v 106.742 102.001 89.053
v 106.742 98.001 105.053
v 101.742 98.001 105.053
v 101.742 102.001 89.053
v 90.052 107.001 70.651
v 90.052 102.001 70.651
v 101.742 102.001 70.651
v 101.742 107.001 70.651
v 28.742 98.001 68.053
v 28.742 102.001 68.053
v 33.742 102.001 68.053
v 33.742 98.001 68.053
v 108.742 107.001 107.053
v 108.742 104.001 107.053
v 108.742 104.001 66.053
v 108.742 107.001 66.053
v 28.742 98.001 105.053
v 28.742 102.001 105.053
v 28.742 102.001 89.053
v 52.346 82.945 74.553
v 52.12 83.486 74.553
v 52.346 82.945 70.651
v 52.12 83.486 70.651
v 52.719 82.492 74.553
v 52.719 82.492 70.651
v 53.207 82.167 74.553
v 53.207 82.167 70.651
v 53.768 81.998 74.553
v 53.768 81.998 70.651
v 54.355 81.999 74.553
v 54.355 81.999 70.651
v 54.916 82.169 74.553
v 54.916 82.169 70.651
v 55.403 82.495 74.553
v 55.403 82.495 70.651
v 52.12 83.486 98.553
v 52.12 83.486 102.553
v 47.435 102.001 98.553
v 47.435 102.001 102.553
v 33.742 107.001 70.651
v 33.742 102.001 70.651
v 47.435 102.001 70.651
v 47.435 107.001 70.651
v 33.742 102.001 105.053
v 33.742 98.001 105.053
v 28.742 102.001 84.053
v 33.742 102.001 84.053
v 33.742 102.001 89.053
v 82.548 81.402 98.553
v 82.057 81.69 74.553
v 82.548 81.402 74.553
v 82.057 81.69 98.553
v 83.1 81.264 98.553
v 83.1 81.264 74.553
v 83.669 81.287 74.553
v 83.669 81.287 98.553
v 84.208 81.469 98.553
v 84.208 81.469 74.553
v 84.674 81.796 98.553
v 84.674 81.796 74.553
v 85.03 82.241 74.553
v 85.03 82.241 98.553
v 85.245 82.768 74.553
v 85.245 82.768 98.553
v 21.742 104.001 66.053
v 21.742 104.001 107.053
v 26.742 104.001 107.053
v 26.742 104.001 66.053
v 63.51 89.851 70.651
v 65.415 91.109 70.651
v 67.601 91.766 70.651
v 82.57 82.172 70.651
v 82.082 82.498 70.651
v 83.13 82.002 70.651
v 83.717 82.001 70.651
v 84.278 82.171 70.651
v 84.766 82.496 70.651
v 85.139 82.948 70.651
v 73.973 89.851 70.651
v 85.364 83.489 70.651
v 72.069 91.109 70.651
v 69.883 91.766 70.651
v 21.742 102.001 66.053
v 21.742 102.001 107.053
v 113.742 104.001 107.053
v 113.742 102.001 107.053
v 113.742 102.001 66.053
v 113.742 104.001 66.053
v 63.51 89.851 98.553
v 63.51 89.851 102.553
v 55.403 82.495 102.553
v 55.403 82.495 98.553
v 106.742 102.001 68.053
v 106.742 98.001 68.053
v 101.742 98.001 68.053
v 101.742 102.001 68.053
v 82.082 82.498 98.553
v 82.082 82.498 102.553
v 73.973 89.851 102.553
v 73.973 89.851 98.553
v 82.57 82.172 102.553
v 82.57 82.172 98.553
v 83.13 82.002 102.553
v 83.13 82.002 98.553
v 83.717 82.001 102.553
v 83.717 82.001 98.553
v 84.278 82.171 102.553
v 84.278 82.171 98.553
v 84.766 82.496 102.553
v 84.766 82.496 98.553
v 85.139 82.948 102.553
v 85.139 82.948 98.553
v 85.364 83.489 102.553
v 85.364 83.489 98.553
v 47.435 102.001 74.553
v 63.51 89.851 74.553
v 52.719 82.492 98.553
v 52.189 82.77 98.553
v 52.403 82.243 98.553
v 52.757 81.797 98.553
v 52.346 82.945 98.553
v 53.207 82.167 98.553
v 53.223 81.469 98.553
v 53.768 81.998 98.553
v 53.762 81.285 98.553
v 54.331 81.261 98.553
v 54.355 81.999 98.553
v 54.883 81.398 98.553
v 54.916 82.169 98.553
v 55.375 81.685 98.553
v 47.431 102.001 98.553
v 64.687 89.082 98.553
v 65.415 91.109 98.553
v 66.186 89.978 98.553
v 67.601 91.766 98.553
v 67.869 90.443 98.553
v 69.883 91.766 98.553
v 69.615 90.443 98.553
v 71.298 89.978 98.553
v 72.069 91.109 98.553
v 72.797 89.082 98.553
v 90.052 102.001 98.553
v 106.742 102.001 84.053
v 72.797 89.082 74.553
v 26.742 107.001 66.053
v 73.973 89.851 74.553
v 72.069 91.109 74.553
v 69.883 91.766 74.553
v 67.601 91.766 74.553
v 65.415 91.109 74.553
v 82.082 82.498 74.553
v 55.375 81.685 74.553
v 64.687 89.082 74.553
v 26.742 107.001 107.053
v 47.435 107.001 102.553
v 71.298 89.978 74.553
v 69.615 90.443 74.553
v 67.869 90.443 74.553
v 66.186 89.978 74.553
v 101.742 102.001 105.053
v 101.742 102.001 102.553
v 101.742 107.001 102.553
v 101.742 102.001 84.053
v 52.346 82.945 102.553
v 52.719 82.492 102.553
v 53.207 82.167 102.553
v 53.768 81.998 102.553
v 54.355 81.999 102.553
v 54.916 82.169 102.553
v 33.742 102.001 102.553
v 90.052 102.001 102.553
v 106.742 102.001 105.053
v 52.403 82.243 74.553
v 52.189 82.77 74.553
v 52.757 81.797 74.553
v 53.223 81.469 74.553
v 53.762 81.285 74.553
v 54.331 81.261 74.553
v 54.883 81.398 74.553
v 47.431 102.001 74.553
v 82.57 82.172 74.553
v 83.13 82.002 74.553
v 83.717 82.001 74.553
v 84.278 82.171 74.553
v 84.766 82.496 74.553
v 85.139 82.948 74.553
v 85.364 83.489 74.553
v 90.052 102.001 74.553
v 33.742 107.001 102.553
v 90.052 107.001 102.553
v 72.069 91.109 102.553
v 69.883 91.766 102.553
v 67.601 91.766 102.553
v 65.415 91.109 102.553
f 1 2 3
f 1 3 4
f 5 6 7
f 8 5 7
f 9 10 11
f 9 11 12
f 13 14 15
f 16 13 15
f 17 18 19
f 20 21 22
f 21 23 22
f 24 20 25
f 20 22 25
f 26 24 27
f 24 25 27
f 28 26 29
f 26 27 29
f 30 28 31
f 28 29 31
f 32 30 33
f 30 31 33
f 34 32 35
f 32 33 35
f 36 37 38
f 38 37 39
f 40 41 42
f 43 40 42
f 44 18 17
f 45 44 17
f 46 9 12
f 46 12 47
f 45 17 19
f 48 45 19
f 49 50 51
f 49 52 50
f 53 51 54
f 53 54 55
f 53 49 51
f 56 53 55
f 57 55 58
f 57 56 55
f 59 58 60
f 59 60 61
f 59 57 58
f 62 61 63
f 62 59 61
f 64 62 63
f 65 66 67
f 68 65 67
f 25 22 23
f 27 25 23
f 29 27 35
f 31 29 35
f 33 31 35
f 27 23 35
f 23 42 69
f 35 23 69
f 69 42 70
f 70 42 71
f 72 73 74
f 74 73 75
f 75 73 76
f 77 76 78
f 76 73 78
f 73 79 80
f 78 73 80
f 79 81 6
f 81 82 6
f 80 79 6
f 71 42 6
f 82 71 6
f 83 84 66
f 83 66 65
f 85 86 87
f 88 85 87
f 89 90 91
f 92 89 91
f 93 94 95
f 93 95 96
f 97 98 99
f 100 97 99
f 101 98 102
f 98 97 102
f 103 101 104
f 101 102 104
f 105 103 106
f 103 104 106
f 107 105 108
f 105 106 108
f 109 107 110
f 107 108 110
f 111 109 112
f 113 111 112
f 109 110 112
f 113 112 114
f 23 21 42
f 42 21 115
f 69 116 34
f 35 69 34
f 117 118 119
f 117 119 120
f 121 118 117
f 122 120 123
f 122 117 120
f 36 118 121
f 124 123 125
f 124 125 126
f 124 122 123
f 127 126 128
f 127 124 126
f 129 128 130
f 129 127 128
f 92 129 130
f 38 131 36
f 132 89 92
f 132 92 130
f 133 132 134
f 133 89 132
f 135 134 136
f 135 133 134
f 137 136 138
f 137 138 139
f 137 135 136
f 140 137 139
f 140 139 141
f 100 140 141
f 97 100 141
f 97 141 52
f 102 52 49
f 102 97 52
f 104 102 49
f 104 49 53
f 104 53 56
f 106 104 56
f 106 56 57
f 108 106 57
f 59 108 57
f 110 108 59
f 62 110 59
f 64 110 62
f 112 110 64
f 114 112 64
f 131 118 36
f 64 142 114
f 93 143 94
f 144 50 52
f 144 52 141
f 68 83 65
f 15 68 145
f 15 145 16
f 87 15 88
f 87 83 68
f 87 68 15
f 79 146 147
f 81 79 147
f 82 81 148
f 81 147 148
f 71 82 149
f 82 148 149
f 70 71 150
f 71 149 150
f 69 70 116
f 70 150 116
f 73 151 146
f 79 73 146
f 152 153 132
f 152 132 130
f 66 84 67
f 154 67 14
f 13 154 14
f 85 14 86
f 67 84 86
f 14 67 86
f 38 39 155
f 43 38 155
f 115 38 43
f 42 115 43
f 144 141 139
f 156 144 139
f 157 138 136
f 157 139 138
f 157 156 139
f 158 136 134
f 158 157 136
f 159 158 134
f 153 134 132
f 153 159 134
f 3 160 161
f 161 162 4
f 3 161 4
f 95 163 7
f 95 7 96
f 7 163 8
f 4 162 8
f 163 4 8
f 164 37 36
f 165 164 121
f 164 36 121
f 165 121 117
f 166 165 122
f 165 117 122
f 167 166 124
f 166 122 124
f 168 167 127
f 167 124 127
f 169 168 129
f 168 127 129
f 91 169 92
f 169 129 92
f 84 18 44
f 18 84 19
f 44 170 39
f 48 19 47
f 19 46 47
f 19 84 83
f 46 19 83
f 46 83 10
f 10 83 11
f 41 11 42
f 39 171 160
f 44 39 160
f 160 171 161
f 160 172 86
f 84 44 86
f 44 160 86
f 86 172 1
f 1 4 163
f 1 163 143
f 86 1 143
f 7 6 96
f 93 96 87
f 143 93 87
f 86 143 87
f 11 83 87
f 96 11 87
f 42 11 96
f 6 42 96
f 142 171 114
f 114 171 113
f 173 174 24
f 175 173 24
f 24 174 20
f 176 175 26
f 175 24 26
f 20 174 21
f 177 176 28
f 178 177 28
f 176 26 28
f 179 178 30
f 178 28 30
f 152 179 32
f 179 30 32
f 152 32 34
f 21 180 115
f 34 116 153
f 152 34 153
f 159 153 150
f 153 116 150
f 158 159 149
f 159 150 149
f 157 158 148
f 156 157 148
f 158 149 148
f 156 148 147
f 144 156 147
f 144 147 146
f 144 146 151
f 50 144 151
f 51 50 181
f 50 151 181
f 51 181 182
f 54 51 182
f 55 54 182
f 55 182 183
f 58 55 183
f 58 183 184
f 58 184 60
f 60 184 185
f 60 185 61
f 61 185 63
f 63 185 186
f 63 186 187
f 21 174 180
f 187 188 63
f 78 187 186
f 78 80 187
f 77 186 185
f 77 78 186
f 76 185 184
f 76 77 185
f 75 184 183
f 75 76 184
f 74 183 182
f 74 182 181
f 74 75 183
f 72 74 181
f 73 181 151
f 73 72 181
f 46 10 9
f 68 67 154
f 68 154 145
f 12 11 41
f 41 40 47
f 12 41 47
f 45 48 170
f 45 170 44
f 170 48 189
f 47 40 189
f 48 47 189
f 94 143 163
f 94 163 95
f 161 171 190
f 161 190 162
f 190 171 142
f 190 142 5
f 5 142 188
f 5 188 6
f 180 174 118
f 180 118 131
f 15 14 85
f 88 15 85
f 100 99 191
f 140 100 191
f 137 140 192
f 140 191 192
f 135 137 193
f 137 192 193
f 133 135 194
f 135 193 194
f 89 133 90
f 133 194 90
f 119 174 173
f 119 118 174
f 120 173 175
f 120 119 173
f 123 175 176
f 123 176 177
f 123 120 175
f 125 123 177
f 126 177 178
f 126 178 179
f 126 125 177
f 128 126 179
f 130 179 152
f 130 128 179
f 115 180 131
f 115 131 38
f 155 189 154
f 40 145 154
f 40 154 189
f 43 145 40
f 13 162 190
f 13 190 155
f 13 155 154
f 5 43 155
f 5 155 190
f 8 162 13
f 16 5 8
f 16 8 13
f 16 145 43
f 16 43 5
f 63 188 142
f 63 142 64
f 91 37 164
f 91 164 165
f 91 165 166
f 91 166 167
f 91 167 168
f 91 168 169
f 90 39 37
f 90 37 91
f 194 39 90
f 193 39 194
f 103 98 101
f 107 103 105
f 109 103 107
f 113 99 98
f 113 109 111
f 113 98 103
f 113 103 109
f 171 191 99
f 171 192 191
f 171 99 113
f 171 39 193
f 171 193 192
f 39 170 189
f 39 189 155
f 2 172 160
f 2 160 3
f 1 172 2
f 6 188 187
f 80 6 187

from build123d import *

# Parameters (mm, degrees)
SKETCH_1_W                = 75.557626564
SKETCH_1_H                = 3.901331086
EXTRUDE_1_DEPTH           = 25
SKETCH_1_H_2              = 4
EXTRUDE_1_2_DEPTH         = 25
CUT_EXTRUDE_15_DEPTH      = 32
SKETCH_1_6_W              = 75.557626564
SKETCH_1_6_H              = 24
EXTRUDE_5_DEPTH           = 25
CUT_EXTRUDE_16_DEPTH      = 153.500220667
CUT_EXTRUDE_16_DEPTH_BACK = 153.500220667
FILLET_2_R                = 2
FILLET_3_R                = 2
EXTRUDE_6_DEPTH           = 5
EXTRUDE_6_2_DEPTH         = 5
EXTRUDE_7_DEPTH           = 5
EXTRUDE_7_2_DEPTH         = 5
SKETCH_6_W                = 82
SKETCH_6_H                = 41
SKETCH_6_W_2              = 13.693142479
SKETCH_6_H_2              = 31.901331086
SKETCH_6_W_3              = 11.689861707
EXTRUDE_8_DEPTH           = 5
SKETCH_7_W                = 5
SKETCH_7_H                = 41
EXTRUDE_9_DEPTH           = 2
CUT_EXTRUDE_17_DEPTH      = 163.242088223
CUT_EXTRUDE_17_DEPTH_BACK = 163.242088223


with BuildPart() as part:
    # Эскиз1 → Бобышка-Вытянуть1 (new body)
    with BuildSketch(Plane(origin=(0, 102.001425994, 0), x_dir=(1, 0, 0), z_dir=(0, 1, 0))):
        with Locations((68.52058233, -72.602036932)):
            Rectangle(SKETCH_1_W, SKETCH_1_H)
    extrude(amount=-EXTRUDE_1_DEPTH)


with BuildPart() as body_2:
    # Эскиз1 → Extrude 1 2 (new body)
    with BuildSketch(Plane(origin=(0, 102.001425994, 0), x_dir=(1, 0, 0), z_dir=(0, 1, 0))):
        with Locations((68.52058233, -100.552702475)):
            Rectangle(SKETCH_1_W, SKETCH_1_H_2)
    extrude(amount=-EXTRUDE_1_2_DEPTH)


with BuildPart() as cut_extrude_15_tool:
    # Эскиз2 → Вырез-Вытянуть15 (new body)
    with BuildSketch(Plane.XY.offset(102.552702475)):
        with BuildLine():
            Line((63.510266919, 89.850934142), (52.937126115, 80.258094246))
            Line((52.937126115, 80.258094246), (47.434911527, 102.001425994))
            Line((47.434911527, 102.001425994), (30.741769048, 102.001425994))
            Line((30.741769048, 102.001425994), (30.741769048, 77.001425994))
            Line((30.741769048, 77.001425994), (106.299395612, 77.001425994))
            Line((106.299395612, 77.001425994), (106.299395612, 102.001425994))
            Line((106.299395612, 102.001425994), (90.051907341, 102.001425994))
            Line((90.051907341, 102.001425994), (84.547557962, 80.262935973))
            Line((84.547557962, 80.262935973), (73.973273177, 89.850934142))
            ThreePointArc((73.973273177, 89.850934142), (68.741770048, 91.84906096), (63.510266919, 89.850934142))
        make_face()
    extrude(amount=-CUT_EXTRUDE_15_DEPTH)


with BuildPart() as part_1:
    add(part.part)

    # Вырез-Вытянуть15: cut by cut_extrude_15_tool
    add(cut_extrude_15_tool.part, mode=Mode.SUBTRACT)



with BuildPart() as body_2_1:
    add(body_2.part)

    # Вырез-Вытянуть15: cut by cut_extrude_15_tool
    add(cut_extrude_15_tool.part, mode=Mode.SUBTRACT)


with BuildPart() as part_2:
    add(part_1.part)

    add(body_2_1.part)  # Бобышка-Вытянуть5 merges body 2
    # Эскиз1<6> → Бобышка-Вытянуть5 (add)
    with BuildSketch(Plane(origin=(0, 102.001425994, 0), x_dir=(1, 0, 0), z_dir=(0, 1, 0))):
        with Locations((68.52058233, -86.552702475)):
            Rectangle(SKETCH_1_6_W, SKETCH_1_6_H)
    extrude(amount=-EXTRUDE_5_DEPTH)

    # Эскиз3 → Вырез-Вытянуть16 (cut, two sides: drawn at the far end of the back side and taken through both)
    with BuildSketch(Plane.XY.offset(110.052702475).offset(-CUT_EXTRUDE_16_DEPTH_BACK)):
        with BuildLine():
            Line((52.937126115, 79.748220071), (47.431470764, 102.001425994))
            Line((47.431470764, 102.001425994), (30.73376132, 102.001425994))
            Line((30.73376132, 102.001425994), (30.741769048, 77.001425994))
            Line((30.741769048, 77.001425994), (88.549097609, 77.001425994))
            ThreePointArc((88.549097609, 77.001425994), (93.741770048, 86.149059032), (98.934442488, 77.001425994))
            Line((98.934442488, 77.001425994), (106.299395612, 77.001425994))
            Line((106.299395612, 77.001425994), (106.299395612, 102.001425994))
            Line((106.299395612, 102.001425994), (90.051907341, 102.001425994))
            Line((90.051907341, 102.001425994), (84.489905965, 79.748220071))
            Line((84.489905965, 79.748220071), (72.796657252, 89.081573622))
            ThreePointArc((72.796657252, 89.081573622), (68.741770048, 90.501426994), (64.686882844, 89.081573622))
            Line((64.686882844, 89.081573622), (52.937126115, 79.748220071))
        make_face()
    extrude(amount=CUT_EXTRUDE_16_DEPTH + CUT_EXTRUDE_16_DEPTH_BACK, mode=Mode.SUBTRACT)


with BuildPart() as cut_extrude_16_piece_1:
    # of the separate pieces the step leaves, piece 1, a body of its own (cut_extrude_16_pieces)
    add(part_2.part.solids().sort_by_distance((90.051907341, 102.001425994, 74.552702475))[0])

    # Скругление2
    fillet_2_edges = [cut_extrude_16_piece_1.edges().sort_by_distance(p)[0] for p in [
        (52.937126115, 80.258094246, 100.552702475),
        (52.937126115, 80.258094246, 72.602036932),
        (84.547557962, 80.262935973, 100.552702475),
        (84.547557962, 80.262935973, 72.602036932),
    ]]
    fillet(fillet_2_edges, radius=FILLET_2_R)

    # Скругление3
    fillet_3_edges = [cut_extrude_16_piece_1.edges().sort_by_distance(p)[0] for p in [
        (84.489905965, 79.748220071, 86.552702475),
        (52.937126115, 79.748220071, 86.552702475),
    ]]
    fillet(fillet_3_edges, radius=FILLET_3_R)



with BuildPart() as cut_extrude_16_piece_2:
    # of the separate pieces the step leaves, piece 2, a body of its own (cut_extrude_16_pieces)
    add(part_2.part.solids().sort_by_distance((88.549097609, 77.001425994, 74.552702475))[0])

    # Эскиз3<3> → Вырез-Вытянуть17 (cut, two sides: drawn at the far end of the back side and taken through both)
    with BuildSketch(Plane.XY.offset(110.052702475).offset(-CUT_EXTRUDE_17_DEPTH_BACK)):
        with BuildLine():
            ThreePointArc((99.789402086, 80.101426994), (92.13390173, 85.931402357), (88.549097609, 77.001425994))
            Line((88.549097609, 77.001425994), (98.934442488, 77.001425994))
            ThreePointArc((98.934442488, 77.001425994), (99.571745411, 78.493558676), (99.789402086, 80.101426994))
        make_face()
    extrude(amount=CUT_EXTRUDE_17_DEPTH + CUT_EXTRUDE_17_DEPTH_BACK, mode=Mode.SUBTRACT)


with BuildPart() as body_3:
    # Эскиз4 → Бобышка-Вытянуть6 (new body)
    with BuildSketch(Plane(origin=(28.741769048, 0, 0), x_dir=(0, 0, -1), z_dir=(1, 0, 0))):
        Polygon((-105.052702475, 102.001425994), (-105.052702475, 98.001425994), (-89.052702475, 102.001425994), align=None)
    extrude(amount=EXTRUDE_6_DEPTH)


with BuildPart() as body_4:
    # Эскиз4 → Extrude 6 2 (new body)
    with BuildSketch(Plane(origin=(28.741769048, 0, 0), x_dir=(0, 0, -1), z_dir=(1, 0, 0))):
        Polygon((-68.052702475, 102.001425994), (-68.052702475, 98.001425994), (-84.052702475, 102.001425994), align=None)
    extrude(amount=EXTRUDE_6_2_DEPTH)


with BuildPart() as body_5:
    # Эскиз5 → Бобышка-Вытянуть7 (new body)
    with BuildSketch(Plane.ZY.offset(-106.741769048)):
        Polygon((105.052702475, 102.001425994), (105.052702475, 98.001425994), (89.052702475, 102.001425994), align=None)
    extrude(amount=EXTRUDE_7_DEPTH)


with BuildPart() as body_6:
    # Эскиз5 → Extrude 7 2 (new body)
    with BuildSketch(Plane.ZY.offset(-106.741769048)):
        Polygon((68.052702475, 102.001425994), (84.052702475, 102.001425994), (68.052702475, 98.001425994), align=None)
    extrude(amount=EXTRUDE_7_2_DEPTH)


with BuildPart() as cut_extrude_16_piece_1_1:
    add(cut_extrude_16_piece_1.part)

    add(body_3.part)  # Бобышка-Вытянуть8 merges body 3

    add(body_4.part)  # Бобышка-Вытянуть8 merges body 4

    add(body_5.part)  # Бобышка-Вытянуть8 merges body 5

    add(body_6.part)  # Бобышка-Вытянуть8 merges body 6
    # Эскиз6 → Бобышка-Вытянуть8 (add)
    with BuildSketch(Plane(origin=(0, 102.001425994, 0), x_dir=(1, 0, 0), z_dir=(0, 1, 0))):
        with Locations((67.741769048, -86.552702475)):
            Rectangle(SKETCH_6_W, SKETCH_6_H)
        with Locations((40.588340288, -86.602036932)):
            Rectangle(SKETCH_6_W_2, SKETCH_6_H_2, mode=Mode.SUBTRACT)
        with Locations((95.896838195, -86.602036932)):
            Rectangle(SKETCH_6_W_3, SKETCH_6_H_2, mode=Mode.SUBTRACT)
    extrude(amount=EXTRUDE_8_DEPTH)

    # Эскиз7 → Бобышка-Вытянуть9 (add)
    with BuildSketch(Plane(origin=(0, 102.001425994, 0), x_dir=(1, 0, 0), z_dir=(0, 1, 0))):
        with Locations((24.241769048, -86.552702475)):
            Rectangle(SKETCH_7_W, SKETCH_7_H)
        with Locations((111.241769048, -86.552702475)):
            Rectangle(SKETCH_7_W, SKETCH_7_H)
    extrude(amount=EXTRUDE_9_DEPTH)


solid = cut_extrude_16_piece_1_1.part
